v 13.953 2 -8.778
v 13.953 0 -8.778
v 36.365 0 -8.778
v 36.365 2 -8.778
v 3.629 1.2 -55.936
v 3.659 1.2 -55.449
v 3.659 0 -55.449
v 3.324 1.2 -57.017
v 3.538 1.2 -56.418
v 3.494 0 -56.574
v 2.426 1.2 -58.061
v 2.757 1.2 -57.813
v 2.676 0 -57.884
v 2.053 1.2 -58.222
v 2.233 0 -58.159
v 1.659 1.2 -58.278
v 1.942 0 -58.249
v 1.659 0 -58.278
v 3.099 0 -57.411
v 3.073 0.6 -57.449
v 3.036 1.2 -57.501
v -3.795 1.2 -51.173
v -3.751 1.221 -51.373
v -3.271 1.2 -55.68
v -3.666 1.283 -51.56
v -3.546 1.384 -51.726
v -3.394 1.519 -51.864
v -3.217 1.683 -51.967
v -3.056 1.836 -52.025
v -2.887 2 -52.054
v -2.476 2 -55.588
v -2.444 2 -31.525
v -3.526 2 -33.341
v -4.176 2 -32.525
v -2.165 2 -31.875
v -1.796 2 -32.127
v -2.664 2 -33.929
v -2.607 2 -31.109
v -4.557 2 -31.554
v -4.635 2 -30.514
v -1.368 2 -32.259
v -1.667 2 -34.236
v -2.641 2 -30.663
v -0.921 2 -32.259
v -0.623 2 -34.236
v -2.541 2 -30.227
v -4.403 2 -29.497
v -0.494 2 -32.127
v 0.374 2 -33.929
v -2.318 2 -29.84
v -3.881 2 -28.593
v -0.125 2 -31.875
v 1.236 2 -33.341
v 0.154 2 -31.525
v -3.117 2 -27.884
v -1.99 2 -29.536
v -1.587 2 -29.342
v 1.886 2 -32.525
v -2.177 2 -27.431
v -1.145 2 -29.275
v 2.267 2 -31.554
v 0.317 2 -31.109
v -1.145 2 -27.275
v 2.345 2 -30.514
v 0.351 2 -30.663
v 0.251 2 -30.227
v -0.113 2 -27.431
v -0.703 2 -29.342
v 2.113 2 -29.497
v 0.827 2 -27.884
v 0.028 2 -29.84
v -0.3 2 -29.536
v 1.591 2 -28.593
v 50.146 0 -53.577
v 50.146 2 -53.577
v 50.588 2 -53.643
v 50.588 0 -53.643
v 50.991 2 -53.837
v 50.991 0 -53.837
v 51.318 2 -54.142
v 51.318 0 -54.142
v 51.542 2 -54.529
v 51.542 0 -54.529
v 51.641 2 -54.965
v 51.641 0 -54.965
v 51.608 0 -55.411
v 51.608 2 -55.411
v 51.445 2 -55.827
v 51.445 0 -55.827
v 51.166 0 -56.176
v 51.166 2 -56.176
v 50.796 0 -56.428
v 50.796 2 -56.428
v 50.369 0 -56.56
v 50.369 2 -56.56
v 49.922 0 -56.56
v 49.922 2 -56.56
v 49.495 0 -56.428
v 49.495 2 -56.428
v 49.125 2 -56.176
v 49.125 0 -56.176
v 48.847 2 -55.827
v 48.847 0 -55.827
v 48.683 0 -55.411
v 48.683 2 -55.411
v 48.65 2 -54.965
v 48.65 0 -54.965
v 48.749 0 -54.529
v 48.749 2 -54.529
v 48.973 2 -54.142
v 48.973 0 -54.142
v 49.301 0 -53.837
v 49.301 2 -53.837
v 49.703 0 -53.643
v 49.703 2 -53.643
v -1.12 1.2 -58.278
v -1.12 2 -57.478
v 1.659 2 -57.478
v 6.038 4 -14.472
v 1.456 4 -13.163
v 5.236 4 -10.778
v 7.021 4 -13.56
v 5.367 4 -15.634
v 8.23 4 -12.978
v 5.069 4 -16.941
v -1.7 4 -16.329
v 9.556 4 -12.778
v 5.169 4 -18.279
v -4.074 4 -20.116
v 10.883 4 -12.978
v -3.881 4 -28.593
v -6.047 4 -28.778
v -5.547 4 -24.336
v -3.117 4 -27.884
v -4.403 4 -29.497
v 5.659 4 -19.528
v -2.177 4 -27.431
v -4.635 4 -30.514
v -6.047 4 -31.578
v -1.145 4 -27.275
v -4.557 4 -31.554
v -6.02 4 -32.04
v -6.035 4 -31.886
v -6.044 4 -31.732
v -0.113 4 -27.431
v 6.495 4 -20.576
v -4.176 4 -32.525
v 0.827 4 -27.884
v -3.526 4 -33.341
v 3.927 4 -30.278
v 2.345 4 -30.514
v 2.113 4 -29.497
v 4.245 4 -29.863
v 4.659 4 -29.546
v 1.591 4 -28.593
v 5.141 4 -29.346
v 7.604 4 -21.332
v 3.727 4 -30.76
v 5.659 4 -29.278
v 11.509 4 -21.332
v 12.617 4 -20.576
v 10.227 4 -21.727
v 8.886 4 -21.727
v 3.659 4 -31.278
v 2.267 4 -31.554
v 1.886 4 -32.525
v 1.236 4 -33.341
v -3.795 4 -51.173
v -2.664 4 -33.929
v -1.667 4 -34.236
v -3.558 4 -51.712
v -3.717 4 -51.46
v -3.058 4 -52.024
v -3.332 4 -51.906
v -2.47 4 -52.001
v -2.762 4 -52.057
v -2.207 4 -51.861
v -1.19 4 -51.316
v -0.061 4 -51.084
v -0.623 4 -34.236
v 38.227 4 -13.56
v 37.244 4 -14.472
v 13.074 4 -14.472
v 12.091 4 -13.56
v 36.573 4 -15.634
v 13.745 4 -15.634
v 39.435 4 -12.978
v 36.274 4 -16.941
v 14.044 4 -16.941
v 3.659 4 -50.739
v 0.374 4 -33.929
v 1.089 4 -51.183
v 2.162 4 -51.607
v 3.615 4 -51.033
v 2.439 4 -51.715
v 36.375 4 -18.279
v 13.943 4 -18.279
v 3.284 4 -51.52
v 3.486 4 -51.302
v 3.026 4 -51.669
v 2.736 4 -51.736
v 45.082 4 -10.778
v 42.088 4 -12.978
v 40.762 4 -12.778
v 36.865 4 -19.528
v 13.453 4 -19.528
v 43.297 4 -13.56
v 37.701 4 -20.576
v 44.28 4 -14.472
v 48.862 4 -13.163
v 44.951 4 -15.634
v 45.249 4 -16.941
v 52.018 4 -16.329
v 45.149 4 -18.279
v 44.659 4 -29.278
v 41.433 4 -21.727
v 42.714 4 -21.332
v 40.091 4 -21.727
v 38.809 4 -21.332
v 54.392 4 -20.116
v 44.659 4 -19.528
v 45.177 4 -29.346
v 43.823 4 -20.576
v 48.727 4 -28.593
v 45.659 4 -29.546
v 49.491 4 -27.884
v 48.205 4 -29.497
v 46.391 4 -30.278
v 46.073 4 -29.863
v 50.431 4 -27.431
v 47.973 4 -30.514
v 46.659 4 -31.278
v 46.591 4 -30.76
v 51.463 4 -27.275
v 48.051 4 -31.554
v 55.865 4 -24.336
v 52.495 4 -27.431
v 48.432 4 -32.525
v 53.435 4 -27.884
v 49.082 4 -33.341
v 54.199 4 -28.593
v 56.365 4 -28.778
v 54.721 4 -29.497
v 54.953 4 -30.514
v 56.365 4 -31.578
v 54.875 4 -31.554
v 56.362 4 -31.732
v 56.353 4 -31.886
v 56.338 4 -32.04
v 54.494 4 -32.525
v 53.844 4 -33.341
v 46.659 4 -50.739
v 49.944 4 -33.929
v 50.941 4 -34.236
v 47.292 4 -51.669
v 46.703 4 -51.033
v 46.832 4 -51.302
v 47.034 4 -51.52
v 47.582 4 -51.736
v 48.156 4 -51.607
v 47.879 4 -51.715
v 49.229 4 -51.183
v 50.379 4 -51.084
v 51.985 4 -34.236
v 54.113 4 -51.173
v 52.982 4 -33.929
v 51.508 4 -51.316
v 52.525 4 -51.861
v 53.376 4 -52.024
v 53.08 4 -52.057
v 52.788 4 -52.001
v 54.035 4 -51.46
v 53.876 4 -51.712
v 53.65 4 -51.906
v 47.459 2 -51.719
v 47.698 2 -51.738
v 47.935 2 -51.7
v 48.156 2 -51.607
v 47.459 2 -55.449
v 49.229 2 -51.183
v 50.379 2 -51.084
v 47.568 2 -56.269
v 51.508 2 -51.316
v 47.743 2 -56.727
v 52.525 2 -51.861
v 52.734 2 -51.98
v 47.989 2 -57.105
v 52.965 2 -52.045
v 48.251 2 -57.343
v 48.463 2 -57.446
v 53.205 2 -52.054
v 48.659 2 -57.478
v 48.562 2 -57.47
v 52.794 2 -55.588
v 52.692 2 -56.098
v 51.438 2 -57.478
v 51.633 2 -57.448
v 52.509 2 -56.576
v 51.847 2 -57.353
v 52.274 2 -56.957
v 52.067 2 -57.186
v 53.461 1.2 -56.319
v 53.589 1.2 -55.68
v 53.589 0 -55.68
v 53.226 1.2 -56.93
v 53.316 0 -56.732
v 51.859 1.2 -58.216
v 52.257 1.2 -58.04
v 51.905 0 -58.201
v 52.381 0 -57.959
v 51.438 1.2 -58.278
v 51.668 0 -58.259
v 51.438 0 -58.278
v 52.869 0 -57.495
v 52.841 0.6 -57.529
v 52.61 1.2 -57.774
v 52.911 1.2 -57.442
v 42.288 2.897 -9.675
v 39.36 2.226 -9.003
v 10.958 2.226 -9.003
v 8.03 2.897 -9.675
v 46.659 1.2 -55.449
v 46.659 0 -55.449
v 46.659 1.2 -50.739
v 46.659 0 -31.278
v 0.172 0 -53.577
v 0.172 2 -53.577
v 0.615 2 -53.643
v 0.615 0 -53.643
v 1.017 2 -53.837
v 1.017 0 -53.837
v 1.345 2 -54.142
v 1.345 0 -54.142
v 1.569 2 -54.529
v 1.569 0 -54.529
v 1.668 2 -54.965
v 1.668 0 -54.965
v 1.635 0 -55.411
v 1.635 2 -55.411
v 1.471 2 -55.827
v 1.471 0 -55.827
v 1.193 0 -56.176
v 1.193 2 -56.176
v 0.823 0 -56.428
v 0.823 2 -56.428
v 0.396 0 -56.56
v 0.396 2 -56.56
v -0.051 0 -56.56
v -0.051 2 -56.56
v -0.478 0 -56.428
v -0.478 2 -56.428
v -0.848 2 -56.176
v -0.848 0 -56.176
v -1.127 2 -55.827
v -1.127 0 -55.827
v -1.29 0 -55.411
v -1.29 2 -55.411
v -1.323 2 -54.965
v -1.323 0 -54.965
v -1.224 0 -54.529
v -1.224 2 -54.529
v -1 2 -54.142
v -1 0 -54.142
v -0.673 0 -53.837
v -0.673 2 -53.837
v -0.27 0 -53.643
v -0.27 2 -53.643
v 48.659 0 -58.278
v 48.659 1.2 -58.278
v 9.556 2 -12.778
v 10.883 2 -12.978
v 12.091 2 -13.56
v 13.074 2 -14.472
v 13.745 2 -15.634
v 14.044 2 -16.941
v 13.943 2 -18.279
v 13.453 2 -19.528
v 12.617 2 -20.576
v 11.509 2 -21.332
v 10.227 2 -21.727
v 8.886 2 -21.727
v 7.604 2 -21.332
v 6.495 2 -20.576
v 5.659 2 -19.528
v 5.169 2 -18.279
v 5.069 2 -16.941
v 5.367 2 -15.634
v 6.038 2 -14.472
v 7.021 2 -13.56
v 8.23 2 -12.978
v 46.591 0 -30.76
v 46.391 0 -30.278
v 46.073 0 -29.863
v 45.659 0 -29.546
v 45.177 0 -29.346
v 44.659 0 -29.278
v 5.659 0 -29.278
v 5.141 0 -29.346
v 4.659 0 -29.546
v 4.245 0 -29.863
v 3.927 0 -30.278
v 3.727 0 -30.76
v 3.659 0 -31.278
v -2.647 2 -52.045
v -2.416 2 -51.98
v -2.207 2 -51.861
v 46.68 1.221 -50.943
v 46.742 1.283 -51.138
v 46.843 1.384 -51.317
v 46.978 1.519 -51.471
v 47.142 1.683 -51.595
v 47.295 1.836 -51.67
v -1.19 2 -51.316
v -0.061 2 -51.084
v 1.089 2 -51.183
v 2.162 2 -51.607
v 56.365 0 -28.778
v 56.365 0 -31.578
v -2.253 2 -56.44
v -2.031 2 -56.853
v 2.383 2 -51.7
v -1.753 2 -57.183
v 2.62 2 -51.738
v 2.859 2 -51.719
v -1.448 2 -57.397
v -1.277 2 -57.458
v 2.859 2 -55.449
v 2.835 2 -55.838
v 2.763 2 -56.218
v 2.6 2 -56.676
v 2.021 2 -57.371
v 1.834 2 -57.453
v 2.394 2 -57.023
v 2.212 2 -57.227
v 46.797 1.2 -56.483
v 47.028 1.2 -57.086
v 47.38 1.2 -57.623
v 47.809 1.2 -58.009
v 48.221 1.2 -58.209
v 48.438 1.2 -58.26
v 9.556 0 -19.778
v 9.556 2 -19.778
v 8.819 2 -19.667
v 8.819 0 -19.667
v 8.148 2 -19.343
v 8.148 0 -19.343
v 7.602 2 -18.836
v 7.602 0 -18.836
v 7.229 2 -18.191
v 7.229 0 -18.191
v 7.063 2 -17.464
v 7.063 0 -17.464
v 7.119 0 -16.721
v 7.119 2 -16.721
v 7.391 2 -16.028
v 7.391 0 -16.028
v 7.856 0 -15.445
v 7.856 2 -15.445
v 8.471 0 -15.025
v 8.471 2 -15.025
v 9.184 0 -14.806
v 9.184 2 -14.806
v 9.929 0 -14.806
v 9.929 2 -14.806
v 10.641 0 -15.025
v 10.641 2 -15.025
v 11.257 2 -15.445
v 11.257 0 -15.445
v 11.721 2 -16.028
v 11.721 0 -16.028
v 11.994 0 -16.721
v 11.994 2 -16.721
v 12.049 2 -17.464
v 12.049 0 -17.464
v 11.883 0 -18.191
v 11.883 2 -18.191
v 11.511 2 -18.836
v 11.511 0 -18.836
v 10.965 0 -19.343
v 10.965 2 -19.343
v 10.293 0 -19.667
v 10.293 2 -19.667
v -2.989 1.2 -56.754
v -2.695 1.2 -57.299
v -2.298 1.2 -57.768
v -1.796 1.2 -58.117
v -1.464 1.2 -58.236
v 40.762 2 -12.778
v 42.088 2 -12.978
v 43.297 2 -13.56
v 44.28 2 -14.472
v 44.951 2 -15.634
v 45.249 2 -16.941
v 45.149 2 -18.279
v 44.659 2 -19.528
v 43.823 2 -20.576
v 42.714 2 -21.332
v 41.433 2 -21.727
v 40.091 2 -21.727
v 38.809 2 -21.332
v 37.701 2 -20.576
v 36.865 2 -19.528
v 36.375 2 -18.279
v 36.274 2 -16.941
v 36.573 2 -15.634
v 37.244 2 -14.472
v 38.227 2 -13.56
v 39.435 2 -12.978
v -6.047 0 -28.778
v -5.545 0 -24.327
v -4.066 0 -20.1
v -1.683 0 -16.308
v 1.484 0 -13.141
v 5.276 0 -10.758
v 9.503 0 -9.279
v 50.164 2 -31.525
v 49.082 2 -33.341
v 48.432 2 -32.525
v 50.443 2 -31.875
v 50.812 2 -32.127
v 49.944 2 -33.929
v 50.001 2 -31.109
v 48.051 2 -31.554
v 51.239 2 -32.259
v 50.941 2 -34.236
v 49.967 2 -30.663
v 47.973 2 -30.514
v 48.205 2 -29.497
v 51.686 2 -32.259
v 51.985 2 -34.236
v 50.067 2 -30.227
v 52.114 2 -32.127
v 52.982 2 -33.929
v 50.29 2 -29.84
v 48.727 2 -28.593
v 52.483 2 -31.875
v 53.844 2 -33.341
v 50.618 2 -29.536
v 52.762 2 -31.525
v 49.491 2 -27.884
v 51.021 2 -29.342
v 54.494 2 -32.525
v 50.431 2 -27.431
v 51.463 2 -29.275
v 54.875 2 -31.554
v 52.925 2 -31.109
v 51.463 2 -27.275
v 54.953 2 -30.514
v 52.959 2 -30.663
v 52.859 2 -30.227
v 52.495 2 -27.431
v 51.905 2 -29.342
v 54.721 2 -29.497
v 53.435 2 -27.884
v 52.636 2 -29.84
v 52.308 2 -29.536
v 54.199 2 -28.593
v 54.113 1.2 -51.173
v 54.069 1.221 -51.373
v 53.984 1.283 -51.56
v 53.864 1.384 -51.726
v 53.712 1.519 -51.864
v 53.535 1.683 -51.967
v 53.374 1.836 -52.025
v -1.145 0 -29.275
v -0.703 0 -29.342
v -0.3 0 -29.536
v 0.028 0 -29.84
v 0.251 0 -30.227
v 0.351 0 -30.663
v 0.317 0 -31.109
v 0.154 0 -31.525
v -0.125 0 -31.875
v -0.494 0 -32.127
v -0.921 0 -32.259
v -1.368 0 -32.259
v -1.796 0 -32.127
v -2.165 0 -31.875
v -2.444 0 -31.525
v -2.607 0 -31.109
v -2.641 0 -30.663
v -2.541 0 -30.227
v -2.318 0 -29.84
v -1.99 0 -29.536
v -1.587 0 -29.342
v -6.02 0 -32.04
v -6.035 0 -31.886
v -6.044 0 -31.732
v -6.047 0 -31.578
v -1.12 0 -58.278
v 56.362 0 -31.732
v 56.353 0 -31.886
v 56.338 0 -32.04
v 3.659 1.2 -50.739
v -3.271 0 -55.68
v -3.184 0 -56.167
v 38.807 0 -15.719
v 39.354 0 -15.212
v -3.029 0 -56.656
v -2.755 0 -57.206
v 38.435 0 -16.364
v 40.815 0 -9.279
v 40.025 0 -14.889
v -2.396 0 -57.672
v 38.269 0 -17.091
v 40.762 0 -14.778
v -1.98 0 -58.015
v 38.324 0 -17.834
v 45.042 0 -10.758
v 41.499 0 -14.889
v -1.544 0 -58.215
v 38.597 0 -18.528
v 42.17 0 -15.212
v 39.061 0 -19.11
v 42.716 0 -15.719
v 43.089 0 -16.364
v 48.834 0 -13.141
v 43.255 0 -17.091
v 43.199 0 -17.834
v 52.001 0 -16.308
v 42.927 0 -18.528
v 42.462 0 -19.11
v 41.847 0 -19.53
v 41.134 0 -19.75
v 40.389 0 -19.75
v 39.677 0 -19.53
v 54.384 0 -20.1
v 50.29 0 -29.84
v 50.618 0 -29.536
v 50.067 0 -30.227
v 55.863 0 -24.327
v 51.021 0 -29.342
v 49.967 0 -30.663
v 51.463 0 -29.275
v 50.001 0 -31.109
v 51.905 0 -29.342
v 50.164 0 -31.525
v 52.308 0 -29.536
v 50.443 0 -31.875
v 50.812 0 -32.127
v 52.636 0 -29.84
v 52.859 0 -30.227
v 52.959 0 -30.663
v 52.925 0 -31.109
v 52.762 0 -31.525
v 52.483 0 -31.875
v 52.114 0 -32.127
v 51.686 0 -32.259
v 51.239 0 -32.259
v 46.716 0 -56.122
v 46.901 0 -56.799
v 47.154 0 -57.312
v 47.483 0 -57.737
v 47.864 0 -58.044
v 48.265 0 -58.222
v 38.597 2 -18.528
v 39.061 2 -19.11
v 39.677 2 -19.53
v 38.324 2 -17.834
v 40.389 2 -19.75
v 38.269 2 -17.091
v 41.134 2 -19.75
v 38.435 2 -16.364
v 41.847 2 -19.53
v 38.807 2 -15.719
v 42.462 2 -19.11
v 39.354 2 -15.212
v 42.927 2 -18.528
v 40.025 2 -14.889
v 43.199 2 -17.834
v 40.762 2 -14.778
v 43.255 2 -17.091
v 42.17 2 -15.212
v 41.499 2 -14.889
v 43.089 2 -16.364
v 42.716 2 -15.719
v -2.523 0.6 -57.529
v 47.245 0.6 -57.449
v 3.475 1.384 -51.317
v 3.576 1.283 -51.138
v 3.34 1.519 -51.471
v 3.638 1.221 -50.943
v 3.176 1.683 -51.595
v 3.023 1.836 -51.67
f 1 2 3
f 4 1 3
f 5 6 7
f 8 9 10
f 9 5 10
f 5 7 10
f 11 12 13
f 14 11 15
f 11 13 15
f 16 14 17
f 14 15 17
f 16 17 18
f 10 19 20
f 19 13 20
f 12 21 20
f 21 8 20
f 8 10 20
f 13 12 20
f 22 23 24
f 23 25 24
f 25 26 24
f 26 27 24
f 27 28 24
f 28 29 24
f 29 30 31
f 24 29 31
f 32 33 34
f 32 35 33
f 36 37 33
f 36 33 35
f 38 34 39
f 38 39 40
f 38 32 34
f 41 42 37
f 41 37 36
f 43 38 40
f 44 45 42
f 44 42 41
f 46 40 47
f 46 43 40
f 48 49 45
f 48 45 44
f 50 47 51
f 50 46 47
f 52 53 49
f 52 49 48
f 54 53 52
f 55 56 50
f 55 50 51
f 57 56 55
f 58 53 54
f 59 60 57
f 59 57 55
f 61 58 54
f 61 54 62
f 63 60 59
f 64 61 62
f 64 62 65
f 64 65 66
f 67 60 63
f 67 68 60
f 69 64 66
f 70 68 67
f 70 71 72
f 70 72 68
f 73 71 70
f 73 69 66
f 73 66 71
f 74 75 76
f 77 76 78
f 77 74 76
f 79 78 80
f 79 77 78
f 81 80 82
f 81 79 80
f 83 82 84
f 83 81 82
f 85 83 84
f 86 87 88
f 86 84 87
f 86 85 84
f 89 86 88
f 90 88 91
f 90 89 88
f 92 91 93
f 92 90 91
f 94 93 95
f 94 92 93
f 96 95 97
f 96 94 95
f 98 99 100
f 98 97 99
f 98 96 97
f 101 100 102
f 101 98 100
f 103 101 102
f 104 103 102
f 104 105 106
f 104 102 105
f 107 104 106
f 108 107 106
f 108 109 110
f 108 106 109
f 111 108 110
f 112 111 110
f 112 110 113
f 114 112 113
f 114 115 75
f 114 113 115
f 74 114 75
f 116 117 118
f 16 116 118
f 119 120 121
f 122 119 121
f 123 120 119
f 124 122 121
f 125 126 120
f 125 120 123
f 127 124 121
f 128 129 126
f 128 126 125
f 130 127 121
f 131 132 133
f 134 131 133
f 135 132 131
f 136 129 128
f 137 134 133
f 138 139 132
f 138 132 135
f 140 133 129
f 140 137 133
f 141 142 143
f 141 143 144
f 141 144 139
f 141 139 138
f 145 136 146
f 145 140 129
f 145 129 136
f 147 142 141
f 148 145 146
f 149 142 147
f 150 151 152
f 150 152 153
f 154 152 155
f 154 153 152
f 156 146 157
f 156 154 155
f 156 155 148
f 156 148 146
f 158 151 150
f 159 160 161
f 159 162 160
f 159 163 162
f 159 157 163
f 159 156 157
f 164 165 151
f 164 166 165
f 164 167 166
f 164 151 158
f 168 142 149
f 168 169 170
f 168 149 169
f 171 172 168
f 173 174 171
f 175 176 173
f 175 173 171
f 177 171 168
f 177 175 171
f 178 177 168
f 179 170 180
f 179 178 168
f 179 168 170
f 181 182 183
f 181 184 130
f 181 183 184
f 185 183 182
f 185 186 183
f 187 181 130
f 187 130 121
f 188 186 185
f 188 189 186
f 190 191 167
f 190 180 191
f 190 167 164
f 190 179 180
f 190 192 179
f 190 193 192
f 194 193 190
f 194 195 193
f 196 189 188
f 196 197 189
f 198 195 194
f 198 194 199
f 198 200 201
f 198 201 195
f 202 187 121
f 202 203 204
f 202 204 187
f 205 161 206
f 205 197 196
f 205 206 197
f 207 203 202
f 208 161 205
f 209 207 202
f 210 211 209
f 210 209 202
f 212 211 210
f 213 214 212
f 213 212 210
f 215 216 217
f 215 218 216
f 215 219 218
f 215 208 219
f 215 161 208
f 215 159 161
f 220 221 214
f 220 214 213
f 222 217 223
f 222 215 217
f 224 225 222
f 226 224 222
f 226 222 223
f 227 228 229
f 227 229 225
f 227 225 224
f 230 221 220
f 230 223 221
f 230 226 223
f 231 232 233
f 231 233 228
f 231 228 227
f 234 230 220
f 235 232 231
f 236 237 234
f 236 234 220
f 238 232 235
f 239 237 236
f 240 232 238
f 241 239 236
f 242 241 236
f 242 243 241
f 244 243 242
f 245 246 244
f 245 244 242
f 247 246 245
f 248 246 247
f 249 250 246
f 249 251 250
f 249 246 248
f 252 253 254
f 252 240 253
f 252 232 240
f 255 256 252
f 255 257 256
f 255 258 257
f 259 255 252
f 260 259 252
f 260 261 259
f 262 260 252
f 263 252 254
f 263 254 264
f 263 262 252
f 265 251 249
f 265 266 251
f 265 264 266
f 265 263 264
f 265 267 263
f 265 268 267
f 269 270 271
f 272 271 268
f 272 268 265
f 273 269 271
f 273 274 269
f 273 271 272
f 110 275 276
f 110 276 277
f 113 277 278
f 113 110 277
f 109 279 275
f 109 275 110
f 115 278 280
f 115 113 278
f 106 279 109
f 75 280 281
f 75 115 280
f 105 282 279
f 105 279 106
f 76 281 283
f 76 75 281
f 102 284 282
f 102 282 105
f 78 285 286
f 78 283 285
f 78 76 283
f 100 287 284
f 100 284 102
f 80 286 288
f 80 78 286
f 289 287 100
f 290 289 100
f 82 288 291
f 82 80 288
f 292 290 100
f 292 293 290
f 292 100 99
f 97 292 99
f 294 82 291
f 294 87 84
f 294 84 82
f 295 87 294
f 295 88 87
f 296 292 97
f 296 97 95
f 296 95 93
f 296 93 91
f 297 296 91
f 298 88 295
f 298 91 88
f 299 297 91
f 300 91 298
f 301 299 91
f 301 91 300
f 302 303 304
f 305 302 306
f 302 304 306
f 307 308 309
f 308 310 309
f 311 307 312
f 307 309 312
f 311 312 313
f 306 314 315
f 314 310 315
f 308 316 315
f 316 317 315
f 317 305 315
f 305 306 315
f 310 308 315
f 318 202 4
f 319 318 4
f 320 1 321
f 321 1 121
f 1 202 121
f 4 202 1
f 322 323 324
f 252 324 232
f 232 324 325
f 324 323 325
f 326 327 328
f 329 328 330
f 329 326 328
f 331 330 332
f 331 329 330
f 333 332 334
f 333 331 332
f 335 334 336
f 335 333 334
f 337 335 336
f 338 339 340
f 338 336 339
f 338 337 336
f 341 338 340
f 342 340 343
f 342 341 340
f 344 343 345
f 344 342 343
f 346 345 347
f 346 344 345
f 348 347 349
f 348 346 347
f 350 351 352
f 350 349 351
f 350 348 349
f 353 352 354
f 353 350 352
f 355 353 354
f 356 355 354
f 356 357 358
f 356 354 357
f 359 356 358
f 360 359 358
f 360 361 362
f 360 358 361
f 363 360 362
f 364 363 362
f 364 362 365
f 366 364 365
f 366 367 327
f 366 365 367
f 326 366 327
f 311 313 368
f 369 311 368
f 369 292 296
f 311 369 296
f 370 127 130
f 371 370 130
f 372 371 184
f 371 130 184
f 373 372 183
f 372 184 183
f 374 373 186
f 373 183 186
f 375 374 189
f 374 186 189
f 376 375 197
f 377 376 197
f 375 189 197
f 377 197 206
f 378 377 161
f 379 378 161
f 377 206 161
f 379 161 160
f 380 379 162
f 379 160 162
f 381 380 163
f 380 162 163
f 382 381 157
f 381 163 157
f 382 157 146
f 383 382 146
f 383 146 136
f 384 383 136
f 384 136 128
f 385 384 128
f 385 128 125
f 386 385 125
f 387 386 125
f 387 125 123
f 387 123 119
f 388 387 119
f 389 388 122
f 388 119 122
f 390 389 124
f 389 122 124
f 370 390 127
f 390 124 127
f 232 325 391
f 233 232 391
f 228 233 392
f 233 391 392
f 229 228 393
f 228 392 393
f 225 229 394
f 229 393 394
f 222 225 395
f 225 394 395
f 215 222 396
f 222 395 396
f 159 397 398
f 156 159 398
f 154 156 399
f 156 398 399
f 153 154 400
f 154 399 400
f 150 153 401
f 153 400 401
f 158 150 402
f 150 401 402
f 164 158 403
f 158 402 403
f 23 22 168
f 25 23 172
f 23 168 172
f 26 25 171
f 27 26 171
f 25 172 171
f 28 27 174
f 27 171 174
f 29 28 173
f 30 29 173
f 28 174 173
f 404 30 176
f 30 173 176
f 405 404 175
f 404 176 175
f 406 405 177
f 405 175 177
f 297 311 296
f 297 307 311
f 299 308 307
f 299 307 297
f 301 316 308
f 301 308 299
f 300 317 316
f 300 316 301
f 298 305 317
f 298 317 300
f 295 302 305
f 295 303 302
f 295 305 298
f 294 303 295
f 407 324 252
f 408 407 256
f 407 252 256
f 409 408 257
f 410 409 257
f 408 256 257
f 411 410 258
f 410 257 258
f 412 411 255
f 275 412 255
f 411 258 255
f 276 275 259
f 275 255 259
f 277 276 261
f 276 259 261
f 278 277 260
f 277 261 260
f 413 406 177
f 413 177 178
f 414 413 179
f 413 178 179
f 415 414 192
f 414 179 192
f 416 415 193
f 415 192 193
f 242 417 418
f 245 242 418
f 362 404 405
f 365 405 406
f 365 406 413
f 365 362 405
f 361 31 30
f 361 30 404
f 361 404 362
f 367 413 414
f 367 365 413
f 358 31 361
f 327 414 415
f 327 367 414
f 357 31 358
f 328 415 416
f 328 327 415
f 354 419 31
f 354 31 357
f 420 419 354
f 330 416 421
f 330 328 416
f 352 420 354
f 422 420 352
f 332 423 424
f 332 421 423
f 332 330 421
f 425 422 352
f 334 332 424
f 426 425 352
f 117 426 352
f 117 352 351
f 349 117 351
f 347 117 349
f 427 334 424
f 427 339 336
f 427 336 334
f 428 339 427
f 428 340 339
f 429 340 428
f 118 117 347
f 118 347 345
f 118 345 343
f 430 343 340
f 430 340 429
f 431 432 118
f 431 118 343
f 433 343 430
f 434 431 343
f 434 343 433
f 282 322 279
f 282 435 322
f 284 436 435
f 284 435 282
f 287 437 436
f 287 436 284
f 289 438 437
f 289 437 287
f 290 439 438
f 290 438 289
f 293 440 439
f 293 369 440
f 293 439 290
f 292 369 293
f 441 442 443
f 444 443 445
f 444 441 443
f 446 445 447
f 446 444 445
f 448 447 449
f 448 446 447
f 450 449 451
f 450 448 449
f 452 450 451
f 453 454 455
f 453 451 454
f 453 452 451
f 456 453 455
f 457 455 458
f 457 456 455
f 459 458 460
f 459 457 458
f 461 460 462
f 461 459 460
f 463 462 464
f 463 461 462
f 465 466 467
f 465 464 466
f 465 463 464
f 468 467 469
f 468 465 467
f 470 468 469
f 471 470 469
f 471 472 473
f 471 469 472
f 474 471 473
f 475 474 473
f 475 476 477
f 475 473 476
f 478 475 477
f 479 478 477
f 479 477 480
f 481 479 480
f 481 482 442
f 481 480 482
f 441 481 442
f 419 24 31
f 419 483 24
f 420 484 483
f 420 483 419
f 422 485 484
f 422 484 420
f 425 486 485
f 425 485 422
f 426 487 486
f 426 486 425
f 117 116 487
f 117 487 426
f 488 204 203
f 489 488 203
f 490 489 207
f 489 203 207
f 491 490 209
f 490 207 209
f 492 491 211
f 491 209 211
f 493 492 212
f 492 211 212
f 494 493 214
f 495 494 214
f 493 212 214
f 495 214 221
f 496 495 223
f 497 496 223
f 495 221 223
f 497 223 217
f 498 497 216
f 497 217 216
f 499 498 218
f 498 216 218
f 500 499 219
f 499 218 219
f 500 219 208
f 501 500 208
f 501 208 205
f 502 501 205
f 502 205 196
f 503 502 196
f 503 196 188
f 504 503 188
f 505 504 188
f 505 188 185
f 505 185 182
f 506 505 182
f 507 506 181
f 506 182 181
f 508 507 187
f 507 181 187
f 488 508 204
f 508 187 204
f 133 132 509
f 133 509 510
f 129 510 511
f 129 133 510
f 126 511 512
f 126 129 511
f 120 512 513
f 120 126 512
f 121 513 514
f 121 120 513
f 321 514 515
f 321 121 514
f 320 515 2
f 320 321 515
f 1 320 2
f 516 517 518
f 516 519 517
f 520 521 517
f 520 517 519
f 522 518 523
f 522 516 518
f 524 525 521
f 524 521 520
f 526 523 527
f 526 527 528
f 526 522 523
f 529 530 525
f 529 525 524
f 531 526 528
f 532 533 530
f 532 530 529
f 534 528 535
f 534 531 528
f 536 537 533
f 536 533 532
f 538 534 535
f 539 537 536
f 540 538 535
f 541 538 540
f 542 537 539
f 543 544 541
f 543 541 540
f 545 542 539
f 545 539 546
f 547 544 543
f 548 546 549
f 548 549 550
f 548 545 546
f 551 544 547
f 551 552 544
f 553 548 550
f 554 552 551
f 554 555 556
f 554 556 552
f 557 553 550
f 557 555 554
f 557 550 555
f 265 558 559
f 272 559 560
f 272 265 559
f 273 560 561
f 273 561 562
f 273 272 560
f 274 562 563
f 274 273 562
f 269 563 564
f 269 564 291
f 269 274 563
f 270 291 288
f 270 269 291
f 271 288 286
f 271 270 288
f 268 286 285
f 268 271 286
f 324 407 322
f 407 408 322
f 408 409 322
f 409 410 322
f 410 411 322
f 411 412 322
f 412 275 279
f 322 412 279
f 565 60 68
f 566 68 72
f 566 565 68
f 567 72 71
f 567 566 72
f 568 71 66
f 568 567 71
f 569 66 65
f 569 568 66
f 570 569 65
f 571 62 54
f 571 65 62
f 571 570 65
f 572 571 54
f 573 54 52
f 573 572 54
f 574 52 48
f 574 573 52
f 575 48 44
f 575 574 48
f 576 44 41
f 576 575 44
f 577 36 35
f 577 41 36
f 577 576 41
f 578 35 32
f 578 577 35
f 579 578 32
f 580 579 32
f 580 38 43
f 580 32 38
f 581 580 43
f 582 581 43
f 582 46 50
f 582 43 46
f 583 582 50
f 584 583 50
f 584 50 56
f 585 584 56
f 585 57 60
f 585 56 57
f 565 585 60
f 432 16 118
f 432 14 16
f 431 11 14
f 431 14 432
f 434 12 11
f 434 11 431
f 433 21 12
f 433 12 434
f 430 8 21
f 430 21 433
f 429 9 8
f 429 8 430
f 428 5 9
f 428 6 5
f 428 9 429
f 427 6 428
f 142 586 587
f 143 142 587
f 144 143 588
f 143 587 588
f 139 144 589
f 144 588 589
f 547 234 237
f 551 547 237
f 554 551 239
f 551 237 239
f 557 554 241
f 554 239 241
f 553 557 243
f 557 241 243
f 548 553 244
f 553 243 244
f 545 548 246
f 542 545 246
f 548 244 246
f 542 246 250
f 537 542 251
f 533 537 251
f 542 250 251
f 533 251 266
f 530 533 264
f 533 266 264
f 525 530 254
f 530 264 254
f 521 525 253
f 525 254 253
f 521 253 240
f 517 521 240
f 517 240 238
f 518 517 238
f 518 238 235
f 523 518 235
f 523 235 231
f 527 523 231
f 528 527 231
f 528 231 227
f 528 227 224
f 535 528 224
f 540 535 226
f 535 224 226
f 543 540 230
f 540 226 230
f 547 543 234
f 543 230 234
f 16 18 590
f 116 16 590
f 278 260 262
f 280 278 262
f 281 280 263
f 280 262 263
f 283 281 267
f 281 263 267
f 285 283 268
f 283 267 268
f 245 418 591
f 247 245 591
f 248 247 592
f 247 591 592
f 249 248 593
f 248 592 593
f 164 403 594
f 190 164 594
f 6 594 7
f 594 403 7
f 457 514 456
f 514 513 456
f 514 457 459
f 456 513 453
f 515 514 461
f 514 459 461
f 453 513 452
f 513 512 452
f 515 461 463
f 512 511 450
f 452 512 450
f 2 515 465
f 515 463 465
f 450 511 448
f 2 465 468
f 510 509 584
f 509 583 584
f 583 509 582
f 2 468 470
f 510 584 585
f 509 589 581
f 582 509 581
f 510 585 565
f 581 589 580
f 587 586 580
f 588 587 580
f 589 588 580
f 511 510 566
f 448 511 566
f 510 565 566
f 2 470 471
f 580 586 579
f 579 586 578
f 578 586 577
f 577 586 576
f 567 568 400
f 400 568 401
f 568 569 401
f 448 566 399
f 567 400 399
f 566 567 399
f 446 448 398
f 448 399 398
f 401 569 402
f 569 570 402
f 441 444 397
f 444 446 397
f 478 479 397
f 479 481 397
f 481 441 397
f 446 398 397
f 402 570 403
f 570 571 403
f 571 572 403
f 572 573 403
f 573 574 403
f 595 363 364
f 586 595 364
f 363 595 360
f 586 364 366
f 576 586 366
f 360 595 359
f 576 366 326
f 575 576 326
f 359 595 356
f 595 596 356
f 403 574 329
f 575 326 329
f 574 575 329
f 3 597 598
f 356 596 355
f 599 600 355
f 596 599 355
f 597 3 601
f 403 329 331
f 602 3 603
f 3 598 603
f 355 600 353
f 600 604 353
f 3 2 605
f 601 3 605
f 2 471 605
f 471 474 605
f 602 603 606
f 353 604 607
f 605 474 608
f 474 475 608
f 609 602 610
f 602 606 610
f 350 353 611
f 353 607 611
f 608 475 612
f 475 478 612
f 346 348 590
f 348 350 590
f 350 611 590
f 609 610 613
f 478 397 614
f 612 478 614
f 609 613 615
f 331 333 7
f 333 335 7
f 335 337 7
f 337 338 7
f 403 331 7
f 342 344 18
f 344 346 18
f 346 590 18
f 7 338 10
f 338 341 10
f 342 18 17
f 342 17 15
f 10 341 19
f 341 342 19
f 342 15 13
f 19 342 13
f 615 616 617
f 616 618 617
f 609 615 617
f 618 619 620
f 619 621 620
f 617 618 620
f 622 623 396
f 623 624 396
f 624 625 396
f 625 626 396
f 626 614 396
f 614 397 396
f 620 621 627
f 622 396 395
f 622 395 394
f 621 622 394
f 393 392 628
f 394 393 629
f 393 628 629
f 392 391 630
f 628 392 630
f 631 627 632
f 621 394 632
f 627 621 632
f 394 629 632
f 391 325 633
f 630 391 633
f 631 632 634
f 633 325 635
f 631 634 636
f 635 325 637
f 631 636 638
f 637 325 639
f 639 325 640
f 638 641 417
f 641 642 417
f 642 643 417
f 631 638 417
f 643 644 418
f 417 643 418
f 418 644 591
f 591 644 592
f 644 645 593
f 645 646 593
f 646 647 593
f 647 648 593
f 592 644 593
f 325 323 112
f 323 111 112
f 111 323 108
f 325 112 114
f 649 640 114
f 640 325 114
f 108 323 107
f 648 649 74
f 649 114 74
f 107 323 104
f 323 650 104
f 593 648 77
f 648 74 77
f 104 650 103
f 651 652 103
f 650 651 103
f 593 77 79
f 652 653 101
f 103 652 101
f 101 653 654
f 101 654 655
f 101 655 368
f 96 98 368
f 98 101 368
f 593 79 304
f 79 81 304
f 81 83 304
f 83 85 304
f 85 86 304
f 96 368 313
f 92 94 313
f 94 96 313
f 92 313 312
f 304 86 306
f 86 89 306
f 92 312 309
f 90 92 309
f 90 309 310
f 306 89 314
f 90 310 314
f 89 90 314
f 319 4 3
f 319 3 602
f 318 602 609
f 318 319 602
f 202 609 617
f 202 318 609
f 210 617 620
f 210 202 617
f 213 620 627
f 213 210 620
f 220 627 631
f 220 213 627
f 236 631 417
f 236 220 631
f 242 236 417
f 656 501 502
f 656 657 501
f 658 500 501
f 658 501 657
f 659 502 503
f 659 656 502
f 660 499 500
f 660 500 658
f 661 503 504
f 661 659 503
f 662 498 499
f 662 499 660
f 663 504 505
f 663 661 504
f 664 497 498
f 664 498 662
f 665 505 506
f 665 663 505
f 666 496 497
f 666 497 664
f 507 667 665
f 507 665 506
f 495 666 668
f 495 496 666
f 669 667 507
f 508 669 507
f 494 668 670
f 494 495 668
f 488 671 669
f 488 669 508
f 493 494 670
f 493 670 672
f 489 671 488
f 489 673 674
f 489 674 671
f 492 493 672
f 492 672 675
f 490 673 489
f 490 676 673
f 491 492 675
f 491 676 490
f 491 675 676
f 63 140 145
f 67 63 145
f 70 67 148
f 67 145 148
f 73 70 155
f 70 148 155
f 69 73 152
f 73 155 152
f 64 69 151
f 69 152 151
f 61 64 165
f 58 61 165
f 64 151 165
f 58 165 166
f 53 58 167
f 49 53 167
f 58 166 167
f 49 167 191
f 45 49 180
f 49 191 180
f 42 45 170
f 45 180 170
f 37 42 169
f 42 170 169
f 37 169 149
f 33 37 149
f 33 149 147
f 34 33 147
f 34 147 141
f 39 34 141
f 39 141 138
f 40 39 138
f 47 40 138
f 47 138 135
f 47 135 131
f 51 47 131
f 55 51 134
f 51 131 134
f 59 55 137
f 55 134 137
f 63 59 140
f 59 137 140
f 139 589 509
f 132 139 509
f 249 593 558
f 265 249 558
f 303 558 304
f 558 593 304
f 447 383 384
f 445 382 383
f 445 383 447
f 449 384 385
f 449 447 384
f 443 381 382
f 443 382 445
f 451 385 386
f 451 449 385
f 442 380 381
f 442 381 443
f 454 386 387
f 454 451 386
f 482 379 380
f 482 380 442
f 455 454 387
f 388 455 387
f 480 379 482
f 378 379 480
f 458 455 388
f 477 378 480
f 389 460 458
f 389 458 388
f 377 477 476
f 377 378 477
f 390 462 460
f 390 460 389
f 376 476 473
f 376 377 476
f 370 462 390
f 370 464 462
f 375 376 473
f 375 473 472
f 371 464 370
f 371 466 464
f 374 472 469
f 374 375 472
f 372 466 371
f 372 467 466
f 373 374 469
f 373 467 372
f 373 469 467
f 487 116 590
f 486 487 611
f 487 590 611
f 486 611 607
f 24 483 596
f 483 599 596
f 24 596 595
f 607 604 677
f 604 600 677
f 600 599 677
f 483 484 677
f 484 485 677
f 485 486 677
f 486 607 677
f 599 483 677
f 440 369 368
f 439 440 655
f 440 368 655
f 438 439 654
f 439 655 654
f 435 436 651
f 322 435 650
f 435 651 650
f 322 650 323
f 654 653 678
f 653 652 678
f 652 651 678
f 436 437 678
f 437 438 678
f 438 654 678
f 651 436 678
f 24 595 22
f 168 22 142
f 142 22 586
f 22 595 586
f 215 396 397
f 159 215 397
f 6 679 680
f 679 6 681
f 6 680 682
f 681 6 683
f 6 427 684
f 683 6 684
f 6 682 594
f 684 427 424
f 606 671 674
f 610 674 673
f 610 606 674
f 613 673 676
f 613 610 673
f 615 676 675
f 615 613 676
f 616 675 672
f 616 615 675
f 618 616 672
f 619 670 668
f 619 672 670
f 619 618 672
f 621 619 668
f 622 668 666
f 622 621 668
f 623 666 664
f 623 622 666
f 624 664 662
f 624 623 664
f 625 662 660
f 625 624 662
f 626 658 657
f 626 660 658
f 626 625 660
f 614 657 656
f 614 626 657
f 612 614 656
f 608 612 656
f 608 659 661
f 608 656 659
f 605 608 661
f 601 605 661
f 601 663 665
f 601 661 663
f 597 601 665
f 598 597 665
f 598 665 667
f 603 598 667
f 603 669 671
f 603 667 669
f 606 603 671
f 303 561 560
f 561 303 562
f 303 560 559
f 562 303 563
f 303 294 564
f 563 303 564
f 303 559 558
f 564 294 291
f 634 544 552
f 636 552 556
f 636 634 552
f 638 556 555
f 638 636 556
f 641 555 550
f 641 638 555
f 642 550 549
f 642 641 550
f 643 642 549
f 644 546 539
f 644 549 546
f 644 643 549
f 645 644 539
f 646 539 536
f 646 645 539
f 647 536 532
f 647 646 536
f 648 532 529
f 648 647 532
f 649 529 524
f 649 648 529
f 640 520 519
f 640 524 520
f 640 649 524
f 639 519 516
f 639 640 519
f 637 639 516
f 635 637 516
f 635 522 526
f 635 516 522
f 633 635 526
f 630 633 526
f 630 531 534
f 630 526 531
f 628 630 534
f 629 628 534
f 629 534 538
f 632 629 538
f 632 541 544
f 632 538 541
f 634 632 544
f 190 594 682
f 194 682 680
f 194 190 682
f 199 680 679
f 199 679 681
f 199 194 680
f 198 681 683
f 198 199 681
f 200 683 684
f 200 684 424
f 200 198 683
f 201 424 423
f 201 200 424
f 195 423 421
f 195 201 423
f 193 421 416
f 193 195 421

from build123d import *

# Parameters (mm, degrees)
SZKIC1_R                    = 1.5
SZKIC1_R_2                  = 2.5
DODANIE_WYCI_GNI_CIE1_DEPTH = 4
ZAOKR_GLENIE1_R             = 20
SZKIC2_R                    = 3.5
SZKIC2_R_2                  = 4
SZKIC2_R_3                  = 4.5
WYTNIJ_WYCI_GNI_CIE1_DEPTH  = 2
ZAOKR_GLENIE2_R             = 1
SFAZOWANIE2_SIZE            = 0.8


with BuildPart() as part:
    # Szkic1 → Dodanie-wyciągnięcie1 (new body)
    with BuildSketch(Plane(origin=(0, 0, 0), x_dir=(1, 0, 0), z_dir=(0, 1, 0))):
        with BuildLine():
            Line((1.659006671, 58.277593275), (-1.119868317, 58.277593275))
            add(Edge.make_bspline(
                [(-1.119868317, 58.277593275), (-2.968900305, 58.277593275), (-3.270926516, 55.680167866)],
                knots=[3.223355162, 3.223355162, 3.223355162, 4.71238898, 4.71238898, 4.71238898], degree=2, weights=[1, 0.735415338, 1]))
            Line((-3.270926516, 55.680167866), (-6.019830139, 32.039596707))
            ThreePointArc((-6.019830139, 32.039596707), (-6.039902389, 31.808982465), (-6.046600617, 31.577593275))
            Line((-6.046600617, 31.577593275), (-6.046600617, 8.777593275))
            Line((-6.046600617, 8.777593275), (56.36461396, 8.777593275))
            Line((56.36461396, 8.777593275), (56.36461396, 31.577593275))
            ThreePointArc((56.36461396, 31.577593275), (56.357915732, 31.808982465), (56.337843482, 32.039596707))
            Line((56.337843482, 32.039596707), (53.588939858, 55.680167866))
            add(Edge.make_bspline(
                [(53.588939858, 55.680167866), (53.286913648, 58.277593275), (51.43788166, 58.277593275)],
                knots=[1.570796327, 1.570796327, 1.570796327, 3.059830145, 3.059830145, 3.059830145], degree=2, weights=[1, 0.735415338, 1]))
            Line((51.43788166, 58.277593275), (48.659006671, 58.277593275))
            add(Edge.make_bspline(
                [(48.659006671, 58.277593275), (46.659006671, 58.277593275), (46.659006671, 55.44916615)],
                knots=[3.141592654, 3.141592654, 3.141592654, 4.71238898, 4.71238898, 4.71238898], degree=2, weights=[1, 0.707106781, 1]))
            Line((46.659006671, 55.44916615), (46.659006671, 31.277593275))
            ThreePointArc((46.659006671, 31.277593275), (46.073220234, 29.863379712), (44.659006671, 29.277593275))
            Line((44.659006671, 29.277593275), (5.659006671, 29.277593275))
            ThreePointArc((5.659006671, 29.277593275), (4.244793109, 29.863379712), (3.659006671, 31.277593275))
            Line((3.659006671, 31.277593275), (3.659006671, 55.44916615))
            add(Edge.make_bspline(
                [(3.659006671, 55.44916615), (3.659006671, 58.277593275), (1.659006671, 58.277593275)],
                knots=[1.570796327, 1.570796327, 1.570796327, 3.141592654, 3.141592654, 3.141592654], degree=2, weights=[1, 0.707106781, 1]))
        make_face()
        with Locations(Location((50.145621432, 55.076817676, 0), (0, 0, 270))):
            Circle(SZKIC1_R, mode=Mode.SUBTRACT)
        with Locations(Location((0.172391911, 55.076817676, 0), (0, 0, 270))):
            Circle(SZKIC1_R, mode=Mode.SUBTRACT)
        with Locations(Location((-1.144922446, 30.775394297, 0), (0, 0, 270))):
            Circle(SZKIC1_R, mode=Mode.SUBTRACT)
        with Locations(Location((51.462935789, 30.775394297, 0), (0, 0, 270))):
            Circle(SZKIC1_R, mode=Mode.SUBTRACT)
        with Locations(Location((40.761810316, 17.277593275, 0), (0, 0, 270))):
            Circle(SZKIC1_R_2, mode=Mode.SUBTRACT)
        with Locations(Location((9.556203027, 17.277593275, 0), (0, 0, 90))):
            Circle(SZKIC1_R_2, mode=Mode.SUBTRACT)
    extrude(amount=DODANIE_WYCI_GNI_CIE1_DEPTH)

    # Zaokrąglenie1
    zaokr_glenie1_edges = [part.edges().sort_by_distance(p)[0] for p in [
        (56.36461396, 2, -8.777593275),
        (-6.046600617, 2, -8.777593275),
    ]]
    fillet(zaokr_glenie1_edges, radius=ZAOKR_GLENIE1_R)

    # Szkic2 → Wytnij-wyciągnięcie1 (cut)
    with BuildSketch(Plane(origin=(0, 4, 0), x_dir=(1, 0, 0), z_dir=(0, 1, 0))):
        with Locations(Location((51.462935789, 30.775394297, 0), (0, 0, 270))):
            Circle(SZKIC2_R)
        with Locations((50.145621432, 55.076817676)):
            Circle(SZKIC2_R_2)
        with Locations((0.172391911, 55.076817676)):
            Circle(SZKIC2_R_2)
        with Locations(Location((-1.144922446, 30.775394297, 0), (0, 0, 270))):
            Circle(SZKIC2_R)
        with Locations(Location((9.556203027, 17.277593275, 0), (0, 0, 270))):
            Circle(SZKIC2_R_3)
        with Locations(Location((40.761810316, 17.277593275, 0), (0, 0, 270))):
            Circle(SZKIC2_R_3)
    extrude(amount=-WYTNIJ_WYCI_GNI_CIE1_DEPTH, mode=Mode.SUBTRACT)

    # Zaokrąglenie2
    zaokr_glenie2_edges = [part.edges().sort_by_distance(p)[0] for p in [
        (53.837974946, 3, -53.538466114),
        (-3.519961603, 3, -53.538466114),
        (3.659006671, 3, -53.116328576),
        (46.659006671, 3, -53.116328576),
    ]]
    fillet(zaokr_glenie2_edges, radius=ZAOKR_GLENIE2_R)

    # Sfazowanie1
    # the kernel refuses this chamfer: 2 mm, written as the material it takes off along each edge
    with BuildSketch(Plane(origin=(1.60932104, 4, -8.777593275), x_dir=(0, 0.027495876610586487, -0.9996219169112968), z_dir=(1, 0, 0))) as sfazowanie1_piece_1:
        with BuildLine():
            Line((2.05734639, 0), (-0.11309431, -2.054235587))
            Line((-0.11309431, -2.054235587), (-0.153079186, -2.053135752))
            ThreePointArc((-0.153079186, -2.053135752), (-0.068258454, -1.026795659), (-0.039984877, 0.001099835))
            Line((-0.039984877, 0.001099835), (0.001099835, 0.039984877))
            ThreePointArc((0.001099835, 0.039984877), (1.028995329, 0.011711299), (2.058446225, 0.039984877))
            Line((2.058446225, 0.039984877), (2.05734639, 0))
        make_face()
    extrude(amount=47.099371262, mode=Mode.SUBTRACT)

    # Sfazowanie2
    sfazowanie2_edges = [part.edges().sort_by_distance(p)[0] for p in [
        (3.659006671, 2, -53.094078185),
        (-3.532969865, 2, -53.426595059),
        (3.185598698, 2, -57.276468397),
        (-2.638843717, 2, -57.379483489),
        (0.269569177, 2, -58.277593275),
        (53.850983208, 2, -53.426595059),
        (46.659006671, 2, -53.094078185),
        (52.95685706, 2, -57.37948349),
        (47.132414645, 2, -57.276468396),
        (50.048444166, 2, -58.277593275),
    ]]
    chamfer(sfazowanie2_edges, length=SFAZOWANIE2_SIZE)


solid = part.part
